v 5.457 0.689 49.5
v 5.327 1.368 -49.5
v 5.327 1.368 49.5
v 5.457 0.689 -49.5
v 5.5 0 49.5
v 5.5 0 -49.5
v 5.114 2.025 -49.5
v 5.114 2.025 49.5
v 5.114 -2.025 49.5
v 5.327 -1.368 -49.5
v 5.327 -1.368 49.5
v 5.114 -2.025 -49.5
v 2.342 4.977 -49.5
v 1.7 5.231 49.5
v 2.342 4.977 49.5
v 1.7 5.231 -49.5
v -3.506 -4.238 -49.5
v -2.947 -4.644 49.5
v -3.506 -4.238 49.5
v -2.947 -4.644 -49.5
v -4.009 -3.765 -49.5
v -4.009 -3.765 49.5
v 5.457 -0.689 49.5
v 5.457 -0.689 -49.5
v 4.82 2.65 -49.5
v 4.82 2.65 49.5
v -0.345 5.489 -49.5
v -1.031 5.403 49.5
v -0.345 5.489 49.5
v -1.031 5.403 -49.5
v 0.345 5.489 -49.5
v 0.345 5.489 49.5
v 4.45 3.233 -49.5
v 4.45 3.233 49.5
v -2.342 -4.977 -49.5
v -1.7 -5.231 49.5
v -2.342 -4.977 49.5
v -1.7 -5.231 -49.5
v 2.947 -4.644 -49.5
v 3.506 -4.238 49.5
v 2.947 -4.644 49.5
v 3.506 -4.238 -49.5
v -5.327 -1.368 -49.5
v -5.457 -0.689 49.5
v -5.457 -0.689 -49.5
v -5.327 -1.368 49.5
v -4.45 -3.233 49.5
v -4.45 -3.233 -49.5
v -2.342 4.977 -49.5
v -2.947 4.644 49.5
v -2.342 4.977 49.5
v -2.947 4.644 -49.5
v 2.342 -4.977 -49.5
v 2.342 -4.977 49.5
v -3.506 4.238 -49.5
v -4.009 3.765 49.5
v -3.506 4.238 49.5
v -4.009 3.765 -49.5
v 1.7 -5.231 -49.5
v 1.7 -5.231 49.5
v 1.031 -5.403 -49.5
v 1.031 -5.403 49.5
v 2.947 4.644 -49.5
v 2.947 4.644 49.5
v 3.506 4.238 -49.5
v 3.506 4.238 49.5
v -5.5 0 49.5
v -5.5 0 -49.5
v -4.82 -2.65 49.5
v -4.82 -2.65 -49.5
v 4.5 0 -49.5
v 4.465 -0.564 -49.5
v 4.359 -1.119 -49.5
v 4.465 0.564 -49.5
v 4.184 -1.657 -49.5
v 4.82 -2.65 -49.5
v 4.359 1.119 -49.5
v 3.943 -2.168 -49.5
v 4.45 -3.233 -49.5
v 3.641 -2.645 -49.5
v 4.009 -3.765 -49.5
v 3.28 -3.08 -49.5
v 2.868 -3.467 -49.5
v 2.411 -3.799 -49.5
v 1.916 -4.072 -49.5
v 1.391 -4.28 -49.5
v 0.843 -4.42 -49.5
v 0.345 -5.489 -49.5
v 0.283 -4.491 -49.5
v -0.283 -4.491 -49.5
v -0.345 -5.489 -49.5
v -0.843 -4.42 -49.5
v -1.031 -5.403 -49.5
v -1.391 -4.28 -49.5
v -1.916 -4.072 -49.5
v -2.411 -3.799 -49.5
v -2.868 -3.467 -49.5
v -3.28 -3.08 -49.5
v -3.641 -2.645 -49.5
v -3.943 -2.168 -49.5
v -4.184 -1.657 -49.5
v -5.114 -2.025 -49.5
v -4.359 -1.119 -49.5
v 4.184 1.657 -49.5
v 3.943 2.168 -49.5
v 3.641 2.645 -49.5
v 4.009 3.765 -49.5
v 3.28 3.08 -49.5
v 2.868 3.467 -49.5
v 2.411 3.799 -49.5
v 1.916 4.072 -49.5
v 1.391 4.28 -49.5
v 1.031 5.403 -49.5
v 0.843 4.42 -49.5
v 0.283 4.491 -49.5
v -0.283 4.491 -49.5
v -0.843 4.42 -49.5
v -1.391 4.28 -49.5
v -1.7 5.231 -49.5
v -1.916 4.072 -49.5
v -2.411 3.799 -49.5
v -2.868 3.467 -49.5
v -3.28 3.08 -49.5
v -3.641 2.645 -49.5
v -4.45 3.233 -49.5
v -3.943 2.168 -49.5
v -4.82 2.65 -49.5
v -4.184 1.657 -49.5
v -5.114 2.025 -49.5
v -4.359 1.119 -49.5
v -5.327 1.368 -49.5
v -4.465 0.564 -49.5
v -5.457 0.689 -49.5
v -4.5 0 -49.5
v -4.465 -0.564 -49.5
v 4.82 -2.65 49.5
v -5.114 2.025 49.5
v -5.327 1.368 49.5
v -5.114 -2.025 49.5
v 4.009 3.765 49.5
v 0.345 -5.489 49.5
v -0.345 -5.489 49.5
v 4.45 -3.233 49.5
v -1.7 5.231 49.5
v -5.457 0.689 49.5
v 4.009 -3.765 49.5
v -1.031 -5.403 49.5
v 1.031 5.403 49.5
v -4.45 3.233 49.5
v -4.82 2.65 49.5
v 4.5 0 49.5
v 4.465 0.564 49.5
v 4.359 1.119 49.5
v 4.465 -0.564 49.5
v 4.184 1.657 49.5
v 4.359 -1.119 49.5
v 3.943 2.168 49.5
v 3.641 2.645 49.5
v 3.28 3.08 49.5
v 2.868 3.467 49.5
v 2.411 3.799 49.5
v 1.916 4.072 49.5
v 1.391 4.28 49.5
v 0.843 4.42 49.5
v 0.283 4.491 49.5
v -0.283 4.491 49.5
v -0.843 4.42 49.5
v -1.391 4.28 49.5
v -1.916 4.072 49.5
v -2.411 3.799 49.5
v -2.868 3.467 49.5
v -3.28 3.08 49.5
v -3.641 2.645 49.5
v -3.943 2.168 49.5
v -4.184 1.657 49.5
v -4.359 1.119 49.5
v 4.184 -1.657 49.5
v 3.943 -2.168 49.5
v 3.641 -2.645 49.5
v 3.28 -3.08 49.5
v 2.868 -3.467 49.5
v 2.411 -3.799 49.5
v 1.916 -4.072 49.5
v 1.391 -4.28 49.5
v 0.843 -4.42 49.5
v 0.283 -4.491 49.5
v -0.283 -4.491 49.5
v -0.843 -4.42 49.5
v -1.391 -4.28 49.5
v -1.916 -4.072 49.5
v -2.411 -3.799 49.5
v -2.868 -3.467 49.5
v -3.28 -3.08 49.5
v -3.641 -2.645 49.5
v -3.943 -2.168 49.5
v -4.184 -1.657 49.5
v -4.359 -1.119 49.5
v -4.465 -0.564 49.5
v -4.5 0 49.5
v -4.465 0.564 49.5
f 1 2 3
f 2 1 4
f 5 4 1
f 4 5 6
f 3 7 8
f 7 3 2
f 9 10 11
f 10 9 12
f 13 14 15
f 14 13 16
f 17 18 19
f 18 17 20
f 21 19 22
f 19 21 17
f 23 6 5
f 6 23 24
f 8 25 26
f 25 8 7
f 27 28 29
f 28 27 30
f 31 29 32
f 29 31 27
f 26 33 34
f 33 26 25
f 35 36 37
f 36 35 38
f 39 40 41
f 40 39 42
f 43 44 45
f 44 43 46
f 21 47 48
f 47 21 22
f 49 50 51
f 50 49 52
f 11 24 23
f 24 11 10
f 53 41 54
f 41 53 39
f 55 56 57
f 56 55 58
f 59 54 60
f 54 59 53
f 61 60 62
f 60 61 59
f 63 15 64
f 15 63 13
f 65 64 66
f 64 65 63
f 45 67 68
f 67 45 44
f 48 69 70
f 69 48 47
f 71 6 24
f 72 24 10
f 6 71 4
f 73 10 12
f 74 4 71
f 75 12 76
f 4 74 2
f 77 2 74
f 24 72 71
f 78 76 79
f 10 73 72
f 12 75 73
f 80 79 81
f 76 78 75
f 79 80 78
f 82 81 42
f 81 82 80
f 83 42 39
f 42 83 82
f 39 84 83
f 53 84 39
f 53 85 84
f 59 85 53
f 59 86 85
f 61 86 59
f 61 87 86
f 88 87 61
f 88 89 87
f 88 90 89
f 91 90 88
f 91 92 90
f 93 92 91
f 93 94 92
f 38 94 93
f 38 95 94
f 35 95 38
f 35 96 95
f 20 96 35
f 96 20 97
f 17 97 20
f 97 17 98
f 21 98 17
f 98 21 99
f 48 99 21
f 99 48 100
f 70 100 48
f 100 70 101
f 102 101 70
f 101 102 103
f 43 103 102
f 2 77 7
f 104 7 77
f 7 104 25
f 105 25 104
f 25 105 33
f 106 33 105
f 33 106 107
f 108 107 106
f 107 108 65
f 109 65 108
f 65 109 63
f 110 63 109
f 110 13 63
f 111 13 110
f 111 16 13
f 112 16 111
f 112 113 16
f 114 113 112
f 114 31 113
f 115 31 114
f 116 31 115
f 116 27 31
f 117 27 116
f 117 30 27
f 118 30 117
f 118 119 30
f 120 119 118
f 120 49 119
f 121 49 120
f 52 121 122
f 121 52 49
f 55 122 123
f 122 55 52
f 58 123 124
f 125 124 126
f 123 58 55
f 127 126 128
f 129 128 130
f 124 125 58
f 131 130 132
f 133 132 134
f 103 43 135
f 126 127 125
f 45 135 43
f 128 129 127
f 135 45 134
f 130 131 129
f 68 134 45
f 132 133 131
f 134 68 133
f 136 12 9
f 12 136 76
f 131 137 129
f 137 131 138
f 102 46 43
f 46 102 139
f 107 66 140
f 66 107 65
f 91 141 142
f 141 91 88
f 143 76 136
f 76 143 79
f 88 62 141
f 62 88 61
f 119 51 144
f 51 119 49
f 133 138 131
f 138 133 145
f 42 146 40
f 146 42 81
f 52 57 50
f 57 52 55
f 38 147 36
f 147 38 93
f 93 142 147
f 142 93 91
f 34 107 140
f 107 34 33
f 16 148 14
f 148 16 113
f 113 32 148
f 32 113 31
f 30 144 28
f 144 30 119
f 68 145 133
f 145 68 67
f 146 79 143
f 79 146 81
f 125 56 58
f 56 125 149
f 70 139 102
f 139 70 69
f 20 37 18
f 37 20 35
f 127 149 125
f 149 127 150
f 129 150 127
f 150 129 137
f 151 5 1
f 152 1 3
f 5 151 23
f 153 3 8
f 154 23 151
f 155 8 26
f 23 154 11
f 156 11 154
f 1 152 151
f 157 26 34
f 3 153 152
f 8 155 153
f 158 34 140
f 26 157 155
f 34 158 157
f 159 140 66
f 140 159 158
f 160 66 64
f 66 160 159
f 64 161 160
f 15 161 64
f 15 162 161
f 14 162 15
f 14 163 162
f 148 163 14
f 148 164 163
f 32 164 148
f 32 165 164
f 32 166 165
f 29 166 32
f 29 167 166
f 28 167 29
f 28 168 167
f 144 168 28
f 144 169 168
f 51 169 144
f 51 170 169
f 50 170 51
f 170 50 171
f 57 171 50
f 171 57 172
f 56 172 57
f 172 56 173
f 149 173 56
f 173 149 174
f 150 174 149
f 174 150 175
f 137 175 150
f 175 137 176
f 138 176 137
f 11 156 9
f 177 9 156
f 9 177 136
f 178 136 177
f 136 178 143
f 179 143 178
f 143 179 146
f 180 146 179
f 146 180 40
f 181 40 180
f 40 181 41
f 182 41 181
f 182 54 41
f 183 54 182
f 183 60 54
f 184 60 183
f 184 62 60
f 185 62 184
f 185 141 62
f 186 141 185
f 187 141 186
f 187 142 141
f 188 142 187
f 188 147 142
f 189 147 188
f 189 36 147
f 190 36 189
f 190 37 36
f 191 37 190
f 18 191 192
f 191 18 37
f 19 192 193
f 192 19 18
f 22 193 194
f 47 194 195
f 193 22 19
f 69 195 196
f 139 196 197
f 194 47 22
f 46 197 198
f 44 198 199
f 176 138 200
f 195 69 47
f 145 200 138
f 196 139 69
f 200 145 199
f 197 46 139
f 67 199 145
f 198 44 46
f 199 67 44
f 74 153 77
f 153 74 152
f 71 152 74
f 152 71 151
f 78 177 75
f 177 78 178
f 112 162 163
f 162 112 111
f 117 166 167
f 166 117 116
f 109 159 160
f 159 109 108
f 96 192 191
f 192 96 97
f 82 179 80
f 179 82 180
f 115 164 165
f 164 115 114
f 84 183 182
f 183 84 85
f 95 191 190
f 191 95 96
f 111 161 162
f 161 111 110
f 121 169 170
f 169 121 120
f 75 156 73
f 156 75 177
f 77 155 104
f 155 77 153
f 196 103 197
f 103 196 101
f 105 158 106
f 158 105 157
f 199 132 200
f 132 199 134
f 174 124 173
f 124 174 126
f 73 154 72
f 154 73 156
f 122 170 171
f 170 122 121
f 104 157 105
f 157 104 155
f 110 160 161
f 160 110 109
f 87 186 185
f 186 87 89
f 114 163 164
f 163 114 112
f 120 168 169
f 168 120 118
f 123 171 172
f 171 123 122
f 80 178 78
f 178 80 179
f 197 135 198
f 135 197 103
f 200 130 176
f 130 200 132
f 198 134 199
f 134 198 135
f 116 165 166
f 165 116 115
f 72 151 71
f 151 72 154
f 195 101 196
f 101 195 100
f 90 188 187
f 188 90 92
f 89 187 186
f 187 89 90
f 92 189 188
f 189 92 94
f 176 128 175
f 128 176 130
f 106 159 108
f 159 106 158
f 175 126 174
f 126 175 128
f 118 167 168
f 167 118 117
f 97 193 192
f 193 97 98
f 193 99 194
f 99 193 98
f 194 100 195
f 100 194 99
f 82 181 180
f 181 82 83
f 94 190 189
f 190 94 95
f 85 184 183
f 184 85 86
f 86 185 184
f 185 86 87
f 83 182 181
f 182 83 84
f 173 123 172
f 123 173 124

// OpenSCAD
$fn = 50;


difference() {
	union() {
		translate(v = [0, 0, -49.5000000000]) {
			cylinder(h = 99, r = 5.5000000000);
		}
	}
	union() {
		translate(v = [0, 0, -100.0000000000]) {
			cylinder(h = 200, r = 4.5000000000);
		}
	}
}
